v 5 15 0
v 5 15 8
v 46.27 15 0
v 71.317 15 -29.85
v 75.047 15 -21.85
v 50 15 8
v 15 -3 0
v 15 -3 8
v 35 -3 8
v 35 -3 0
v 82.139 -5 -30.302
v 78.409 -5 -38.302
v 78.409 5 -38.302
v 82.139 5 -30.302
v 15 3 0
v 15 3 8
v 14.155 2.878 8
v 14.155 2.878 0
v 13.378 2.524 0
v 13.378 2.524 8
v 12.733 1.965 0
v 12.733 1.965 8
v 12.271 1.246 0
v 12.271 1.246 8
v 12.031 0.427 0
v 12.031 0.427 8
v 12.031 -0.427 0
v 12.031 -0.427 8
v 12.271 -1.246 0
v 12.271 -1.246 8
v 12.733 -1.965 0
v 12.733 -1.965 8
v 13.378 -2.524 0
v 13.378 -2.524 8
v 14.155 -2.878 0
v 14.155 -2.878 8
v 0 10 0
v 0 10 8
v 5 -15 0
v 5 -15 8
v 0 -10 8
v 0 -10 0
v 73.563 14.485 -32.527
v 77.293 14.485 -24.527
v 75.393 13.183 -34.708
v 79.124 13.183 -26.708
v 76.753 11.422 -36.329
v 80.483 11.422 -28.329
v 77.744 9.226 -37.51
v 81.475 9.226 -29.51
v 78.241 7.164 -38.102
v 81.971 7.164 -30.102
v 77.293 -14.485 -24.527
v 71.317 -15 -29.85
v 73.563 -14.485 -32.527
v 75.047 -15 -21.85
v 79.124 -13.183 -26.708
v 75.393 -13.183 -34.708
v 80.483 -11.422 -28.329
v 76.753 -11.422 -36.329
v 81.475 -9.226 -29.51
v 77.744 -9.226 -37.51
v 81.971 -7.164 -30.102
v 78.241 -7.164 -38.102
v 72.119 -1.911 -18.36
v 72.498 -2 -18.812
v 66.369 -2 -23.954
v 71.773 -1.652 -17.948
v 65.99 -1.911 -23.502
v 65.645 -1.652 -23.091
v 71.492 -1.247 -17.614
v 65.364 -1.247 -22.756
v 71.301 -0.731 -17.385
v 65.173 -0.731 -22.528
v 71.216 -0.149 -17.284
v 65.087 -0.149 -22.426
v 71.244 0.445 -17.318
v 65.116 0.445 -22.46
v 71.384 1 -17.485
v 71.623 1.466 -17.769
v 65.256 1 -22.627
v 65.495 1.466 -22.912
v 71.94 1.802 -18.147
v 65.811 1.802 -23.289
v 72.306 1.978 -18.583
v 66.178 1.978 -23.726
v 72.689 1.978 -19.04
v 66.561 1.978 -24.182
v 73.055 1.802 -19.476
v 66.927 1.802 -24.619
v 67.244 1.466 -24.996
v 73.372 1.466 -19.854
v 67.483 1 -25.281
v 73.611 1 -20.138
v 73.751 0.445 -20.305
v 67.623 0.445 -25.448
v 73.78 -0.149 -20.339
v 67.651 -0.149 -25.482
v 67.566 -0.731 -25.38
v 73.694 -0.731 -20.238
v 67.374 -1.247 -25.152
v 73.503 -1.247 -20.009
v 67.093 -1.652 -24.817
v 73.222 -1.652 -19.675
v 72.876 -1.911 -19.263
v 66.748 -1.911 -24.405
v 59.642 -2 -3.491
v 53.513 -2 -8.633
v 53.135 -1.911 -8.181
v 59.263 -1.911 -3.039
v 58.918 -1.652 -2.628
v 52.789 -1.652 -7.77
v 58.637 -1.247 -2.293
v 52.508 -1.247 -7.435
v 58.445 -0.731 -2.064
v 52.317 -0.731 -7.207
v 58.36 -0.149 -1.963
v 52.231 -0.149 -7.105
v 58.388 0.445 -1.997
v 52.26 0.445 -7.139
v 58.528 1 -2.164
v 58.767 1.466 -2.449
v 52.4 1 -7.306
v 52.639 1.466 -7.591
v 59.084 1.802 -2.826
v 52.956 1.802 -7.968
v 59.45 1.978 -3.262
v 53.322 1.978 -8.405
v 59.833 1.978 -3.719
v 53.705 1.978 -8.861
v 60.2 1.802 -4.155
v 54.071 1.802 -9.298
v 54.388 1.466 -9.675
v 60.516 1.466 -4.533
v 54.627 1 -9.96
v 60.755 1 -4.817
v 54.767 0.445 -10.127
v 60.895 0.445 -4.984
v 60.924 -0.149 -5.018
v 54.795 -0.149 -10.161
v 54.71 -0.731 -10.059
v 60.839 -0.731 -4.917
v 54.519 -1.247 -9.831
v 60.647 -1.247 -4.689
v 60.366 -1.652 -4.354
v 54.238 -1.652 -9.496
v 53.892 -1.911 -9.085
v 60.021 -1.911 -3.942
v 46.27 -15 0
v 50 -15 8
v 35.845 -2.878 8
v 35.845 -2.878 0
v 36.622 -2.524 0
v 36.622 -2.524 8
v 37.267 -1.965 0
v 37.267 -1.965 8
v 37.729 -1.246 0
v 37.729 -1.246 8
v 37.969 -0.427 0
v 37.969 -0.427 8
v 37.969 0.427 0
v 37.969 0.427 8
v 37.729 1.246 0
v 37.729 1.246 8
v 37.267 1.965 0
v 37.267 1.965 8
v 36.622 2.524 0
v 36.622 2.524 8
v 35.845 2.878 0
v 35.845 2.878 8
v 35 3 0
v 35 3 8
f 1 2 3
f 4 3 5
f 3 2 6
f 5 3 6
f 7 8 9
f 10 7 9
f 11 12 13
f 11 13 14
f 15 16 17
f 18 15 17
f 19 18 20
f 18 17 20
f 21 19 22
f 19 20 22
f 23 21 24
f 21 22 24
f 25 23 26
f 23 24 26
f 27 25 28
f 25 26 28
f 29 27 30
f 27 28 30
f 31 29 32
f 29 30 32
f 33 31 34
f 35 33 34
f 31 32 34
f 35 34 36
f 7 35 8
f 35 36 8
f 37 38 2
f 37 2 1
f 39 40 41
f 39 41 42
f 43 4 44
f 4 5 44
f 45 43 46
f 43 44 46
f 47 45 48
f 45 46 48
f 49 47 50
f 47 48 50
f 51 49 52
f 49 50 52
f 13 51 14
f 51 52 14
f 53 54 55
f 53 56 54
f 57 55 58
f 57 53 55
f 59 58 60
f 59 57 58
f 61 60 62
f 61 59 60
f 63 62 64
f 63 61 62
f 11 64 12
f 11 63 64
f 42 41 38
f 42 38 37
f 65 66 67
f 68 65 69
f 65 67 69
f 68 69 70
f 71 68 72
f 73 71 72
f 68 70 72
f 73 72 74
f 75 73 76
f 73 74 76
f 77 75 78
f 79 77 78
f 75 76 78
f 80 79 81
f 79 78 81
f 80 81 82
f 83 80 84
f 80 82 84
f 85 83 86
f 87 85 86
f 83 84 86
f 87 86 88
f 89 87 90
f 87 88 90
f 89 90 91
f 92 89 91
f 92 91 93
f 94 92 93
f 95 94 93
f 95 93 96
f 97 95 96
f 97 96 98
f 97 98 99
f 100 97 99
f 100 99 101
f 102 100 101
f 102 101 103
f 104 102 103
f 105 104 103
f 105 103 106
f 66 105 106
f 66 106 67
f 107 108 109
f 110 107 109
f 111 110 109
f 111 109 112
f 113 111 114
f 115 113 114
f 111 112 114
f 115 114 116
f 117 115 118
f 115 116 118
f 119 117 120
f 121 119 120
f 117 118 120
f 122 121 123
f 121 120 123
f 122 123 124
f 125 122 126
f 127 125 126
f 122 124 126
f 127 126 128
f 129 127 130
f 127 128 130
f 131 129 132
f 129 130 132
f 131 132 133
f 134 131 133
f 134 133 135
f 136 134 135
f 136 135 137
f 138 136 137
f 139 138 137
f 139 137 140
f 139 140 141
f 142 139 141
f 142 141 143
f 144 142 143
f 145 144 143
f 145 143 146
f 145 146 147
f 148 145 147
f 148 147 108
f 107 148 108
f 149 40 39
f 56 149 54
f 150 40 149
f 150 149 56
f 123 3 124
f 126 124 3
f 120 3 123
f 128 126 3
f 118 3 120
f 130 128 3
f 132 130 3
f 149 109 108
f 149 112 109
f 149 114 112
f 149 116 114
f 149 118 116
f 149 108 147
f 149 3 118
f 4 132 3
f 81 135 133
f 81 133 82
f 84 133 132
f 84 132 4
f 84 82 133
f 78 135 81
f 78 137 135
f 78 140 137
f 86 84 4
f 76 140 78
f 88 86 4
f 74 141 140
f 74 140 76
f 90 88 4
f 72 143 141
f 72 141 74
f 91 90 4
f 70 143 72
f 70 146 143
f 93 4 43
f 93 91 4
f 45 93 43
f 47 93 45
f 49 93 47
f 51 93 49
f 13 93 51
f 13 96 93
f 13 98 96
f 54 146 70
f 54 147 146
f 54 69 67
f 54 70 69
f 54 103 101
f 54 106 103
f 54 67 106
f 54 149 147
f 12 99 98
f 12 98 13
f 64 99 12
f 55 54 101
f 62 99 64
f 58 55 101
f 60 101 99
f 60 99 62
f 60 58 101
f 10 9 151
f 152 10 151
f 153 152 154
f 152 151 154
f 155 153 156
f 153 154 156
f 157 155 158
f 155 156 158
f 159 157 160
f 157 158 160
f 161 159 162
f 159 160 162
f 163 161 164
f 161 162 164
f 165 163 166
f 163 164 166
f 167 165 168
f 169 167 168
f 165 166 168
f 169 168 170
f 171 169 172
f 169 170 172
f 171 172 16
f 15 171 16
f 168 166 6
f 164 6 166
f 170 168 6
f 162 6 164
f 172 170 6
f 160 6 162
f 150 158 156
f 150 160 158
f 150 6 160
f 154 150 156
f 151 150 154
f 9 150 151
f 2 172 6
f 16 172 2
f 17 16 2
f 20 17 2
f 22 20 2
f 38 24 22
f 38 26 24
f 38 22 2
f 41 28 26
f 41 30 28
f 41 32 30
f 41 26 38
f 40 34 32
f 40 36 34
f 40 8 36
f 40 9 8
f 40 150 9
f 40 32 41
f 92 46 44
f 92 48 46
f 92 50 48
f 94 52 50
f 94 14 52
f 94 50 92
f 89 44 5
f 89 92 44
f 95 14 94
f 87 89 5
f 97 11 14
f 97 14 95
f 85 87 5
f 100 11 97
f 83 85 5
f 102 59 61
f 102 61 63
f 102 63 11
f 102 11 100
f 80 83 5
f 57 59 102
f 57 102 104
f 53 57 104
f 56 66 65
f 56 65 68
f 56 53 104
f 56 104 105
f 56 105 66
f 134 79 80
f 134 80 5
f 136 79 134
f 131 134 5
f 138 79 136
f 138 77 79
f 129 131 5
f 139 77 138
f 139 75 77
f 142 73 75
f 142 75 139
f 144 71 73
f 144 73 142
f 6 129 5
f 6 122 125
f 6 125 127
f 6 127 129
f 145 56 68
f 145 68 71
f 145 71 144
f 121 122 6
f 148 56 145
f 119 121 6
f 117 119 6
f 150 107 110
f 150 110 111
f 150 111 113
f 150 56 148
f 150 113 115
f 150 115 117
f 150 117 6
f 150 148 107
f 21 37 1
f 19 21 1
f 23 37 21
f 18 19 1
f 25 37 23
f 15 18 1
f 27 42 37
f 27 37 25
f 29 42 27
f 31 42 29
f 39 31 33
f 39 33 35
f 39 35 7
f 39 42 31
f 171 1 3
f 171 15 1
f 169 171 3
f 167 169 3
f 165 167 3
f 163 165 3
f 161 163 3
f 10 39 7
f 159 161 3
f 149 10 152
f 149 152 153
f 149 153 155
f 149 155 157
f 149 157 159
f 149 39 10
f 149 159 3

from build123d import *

# Parameters (mm, degrees)
F1_DEPTH = 15
F3_DEPTH = 46.3032221559
F5_D     = 4
F6_R     = 10
F7_SIZE  = 5


with BuildPart() as f1:
    # F0 (on Front) → F1 (new body, symmetric)
    with BuildSketch(Plane.XZ):
        Polygon((0, 8), (0, 0), (46.2695387348, 0), (78.4089192191, -38.3022221559), (82.1393804843, -30.3022221559), (50, 8), align=None)
    extrude(amount=F1_DEPTH, both=True)

    # F2 (on face) → F3 (cut, through all)
    with BuildSketch(Plane.XY.offset(8)):
        with BuildLine():
            ThreePointArc((15, 3), (12, 0), (15, -3))
            Line((15, -3), (35, -3))
            ThreePointArc((35, -3), (38, 0), (35, 3))
            Line((35, 3), (15, 3))
        make_face()
    extrude(amount=-F3_DEPTH, mode=Mode.SUBTRACT)

    # F5 (through all)
    with Locations(Plane(origin=(33.2804354537, 0, 27.9256011146), x_dir=(0, 1, 0), z_dir=(0.7660444431, 0, 0.6427876097))):
        with Locations((0, -41.0110249394), (0, -61.0110249394)):
            Hole(F5_D / 2)

    # F6
    f6_edges = [f1.edges().sort_by_distance(p)[0] for p in [
        (80.27415, -15, -34.302222),
        (80.27415, 15, -34.302222),
    ]]
    fillet(f6_edges, radius=F6_R)

    # F7
    f7_edges = [f1.edges().sort_by_distance(p)[0] for p in [
        (0, 15, 4),
        (0, -15, 4),
    ]]
    chamfer(f7_edges, length=F7_SIZE)


solid = f1.part
